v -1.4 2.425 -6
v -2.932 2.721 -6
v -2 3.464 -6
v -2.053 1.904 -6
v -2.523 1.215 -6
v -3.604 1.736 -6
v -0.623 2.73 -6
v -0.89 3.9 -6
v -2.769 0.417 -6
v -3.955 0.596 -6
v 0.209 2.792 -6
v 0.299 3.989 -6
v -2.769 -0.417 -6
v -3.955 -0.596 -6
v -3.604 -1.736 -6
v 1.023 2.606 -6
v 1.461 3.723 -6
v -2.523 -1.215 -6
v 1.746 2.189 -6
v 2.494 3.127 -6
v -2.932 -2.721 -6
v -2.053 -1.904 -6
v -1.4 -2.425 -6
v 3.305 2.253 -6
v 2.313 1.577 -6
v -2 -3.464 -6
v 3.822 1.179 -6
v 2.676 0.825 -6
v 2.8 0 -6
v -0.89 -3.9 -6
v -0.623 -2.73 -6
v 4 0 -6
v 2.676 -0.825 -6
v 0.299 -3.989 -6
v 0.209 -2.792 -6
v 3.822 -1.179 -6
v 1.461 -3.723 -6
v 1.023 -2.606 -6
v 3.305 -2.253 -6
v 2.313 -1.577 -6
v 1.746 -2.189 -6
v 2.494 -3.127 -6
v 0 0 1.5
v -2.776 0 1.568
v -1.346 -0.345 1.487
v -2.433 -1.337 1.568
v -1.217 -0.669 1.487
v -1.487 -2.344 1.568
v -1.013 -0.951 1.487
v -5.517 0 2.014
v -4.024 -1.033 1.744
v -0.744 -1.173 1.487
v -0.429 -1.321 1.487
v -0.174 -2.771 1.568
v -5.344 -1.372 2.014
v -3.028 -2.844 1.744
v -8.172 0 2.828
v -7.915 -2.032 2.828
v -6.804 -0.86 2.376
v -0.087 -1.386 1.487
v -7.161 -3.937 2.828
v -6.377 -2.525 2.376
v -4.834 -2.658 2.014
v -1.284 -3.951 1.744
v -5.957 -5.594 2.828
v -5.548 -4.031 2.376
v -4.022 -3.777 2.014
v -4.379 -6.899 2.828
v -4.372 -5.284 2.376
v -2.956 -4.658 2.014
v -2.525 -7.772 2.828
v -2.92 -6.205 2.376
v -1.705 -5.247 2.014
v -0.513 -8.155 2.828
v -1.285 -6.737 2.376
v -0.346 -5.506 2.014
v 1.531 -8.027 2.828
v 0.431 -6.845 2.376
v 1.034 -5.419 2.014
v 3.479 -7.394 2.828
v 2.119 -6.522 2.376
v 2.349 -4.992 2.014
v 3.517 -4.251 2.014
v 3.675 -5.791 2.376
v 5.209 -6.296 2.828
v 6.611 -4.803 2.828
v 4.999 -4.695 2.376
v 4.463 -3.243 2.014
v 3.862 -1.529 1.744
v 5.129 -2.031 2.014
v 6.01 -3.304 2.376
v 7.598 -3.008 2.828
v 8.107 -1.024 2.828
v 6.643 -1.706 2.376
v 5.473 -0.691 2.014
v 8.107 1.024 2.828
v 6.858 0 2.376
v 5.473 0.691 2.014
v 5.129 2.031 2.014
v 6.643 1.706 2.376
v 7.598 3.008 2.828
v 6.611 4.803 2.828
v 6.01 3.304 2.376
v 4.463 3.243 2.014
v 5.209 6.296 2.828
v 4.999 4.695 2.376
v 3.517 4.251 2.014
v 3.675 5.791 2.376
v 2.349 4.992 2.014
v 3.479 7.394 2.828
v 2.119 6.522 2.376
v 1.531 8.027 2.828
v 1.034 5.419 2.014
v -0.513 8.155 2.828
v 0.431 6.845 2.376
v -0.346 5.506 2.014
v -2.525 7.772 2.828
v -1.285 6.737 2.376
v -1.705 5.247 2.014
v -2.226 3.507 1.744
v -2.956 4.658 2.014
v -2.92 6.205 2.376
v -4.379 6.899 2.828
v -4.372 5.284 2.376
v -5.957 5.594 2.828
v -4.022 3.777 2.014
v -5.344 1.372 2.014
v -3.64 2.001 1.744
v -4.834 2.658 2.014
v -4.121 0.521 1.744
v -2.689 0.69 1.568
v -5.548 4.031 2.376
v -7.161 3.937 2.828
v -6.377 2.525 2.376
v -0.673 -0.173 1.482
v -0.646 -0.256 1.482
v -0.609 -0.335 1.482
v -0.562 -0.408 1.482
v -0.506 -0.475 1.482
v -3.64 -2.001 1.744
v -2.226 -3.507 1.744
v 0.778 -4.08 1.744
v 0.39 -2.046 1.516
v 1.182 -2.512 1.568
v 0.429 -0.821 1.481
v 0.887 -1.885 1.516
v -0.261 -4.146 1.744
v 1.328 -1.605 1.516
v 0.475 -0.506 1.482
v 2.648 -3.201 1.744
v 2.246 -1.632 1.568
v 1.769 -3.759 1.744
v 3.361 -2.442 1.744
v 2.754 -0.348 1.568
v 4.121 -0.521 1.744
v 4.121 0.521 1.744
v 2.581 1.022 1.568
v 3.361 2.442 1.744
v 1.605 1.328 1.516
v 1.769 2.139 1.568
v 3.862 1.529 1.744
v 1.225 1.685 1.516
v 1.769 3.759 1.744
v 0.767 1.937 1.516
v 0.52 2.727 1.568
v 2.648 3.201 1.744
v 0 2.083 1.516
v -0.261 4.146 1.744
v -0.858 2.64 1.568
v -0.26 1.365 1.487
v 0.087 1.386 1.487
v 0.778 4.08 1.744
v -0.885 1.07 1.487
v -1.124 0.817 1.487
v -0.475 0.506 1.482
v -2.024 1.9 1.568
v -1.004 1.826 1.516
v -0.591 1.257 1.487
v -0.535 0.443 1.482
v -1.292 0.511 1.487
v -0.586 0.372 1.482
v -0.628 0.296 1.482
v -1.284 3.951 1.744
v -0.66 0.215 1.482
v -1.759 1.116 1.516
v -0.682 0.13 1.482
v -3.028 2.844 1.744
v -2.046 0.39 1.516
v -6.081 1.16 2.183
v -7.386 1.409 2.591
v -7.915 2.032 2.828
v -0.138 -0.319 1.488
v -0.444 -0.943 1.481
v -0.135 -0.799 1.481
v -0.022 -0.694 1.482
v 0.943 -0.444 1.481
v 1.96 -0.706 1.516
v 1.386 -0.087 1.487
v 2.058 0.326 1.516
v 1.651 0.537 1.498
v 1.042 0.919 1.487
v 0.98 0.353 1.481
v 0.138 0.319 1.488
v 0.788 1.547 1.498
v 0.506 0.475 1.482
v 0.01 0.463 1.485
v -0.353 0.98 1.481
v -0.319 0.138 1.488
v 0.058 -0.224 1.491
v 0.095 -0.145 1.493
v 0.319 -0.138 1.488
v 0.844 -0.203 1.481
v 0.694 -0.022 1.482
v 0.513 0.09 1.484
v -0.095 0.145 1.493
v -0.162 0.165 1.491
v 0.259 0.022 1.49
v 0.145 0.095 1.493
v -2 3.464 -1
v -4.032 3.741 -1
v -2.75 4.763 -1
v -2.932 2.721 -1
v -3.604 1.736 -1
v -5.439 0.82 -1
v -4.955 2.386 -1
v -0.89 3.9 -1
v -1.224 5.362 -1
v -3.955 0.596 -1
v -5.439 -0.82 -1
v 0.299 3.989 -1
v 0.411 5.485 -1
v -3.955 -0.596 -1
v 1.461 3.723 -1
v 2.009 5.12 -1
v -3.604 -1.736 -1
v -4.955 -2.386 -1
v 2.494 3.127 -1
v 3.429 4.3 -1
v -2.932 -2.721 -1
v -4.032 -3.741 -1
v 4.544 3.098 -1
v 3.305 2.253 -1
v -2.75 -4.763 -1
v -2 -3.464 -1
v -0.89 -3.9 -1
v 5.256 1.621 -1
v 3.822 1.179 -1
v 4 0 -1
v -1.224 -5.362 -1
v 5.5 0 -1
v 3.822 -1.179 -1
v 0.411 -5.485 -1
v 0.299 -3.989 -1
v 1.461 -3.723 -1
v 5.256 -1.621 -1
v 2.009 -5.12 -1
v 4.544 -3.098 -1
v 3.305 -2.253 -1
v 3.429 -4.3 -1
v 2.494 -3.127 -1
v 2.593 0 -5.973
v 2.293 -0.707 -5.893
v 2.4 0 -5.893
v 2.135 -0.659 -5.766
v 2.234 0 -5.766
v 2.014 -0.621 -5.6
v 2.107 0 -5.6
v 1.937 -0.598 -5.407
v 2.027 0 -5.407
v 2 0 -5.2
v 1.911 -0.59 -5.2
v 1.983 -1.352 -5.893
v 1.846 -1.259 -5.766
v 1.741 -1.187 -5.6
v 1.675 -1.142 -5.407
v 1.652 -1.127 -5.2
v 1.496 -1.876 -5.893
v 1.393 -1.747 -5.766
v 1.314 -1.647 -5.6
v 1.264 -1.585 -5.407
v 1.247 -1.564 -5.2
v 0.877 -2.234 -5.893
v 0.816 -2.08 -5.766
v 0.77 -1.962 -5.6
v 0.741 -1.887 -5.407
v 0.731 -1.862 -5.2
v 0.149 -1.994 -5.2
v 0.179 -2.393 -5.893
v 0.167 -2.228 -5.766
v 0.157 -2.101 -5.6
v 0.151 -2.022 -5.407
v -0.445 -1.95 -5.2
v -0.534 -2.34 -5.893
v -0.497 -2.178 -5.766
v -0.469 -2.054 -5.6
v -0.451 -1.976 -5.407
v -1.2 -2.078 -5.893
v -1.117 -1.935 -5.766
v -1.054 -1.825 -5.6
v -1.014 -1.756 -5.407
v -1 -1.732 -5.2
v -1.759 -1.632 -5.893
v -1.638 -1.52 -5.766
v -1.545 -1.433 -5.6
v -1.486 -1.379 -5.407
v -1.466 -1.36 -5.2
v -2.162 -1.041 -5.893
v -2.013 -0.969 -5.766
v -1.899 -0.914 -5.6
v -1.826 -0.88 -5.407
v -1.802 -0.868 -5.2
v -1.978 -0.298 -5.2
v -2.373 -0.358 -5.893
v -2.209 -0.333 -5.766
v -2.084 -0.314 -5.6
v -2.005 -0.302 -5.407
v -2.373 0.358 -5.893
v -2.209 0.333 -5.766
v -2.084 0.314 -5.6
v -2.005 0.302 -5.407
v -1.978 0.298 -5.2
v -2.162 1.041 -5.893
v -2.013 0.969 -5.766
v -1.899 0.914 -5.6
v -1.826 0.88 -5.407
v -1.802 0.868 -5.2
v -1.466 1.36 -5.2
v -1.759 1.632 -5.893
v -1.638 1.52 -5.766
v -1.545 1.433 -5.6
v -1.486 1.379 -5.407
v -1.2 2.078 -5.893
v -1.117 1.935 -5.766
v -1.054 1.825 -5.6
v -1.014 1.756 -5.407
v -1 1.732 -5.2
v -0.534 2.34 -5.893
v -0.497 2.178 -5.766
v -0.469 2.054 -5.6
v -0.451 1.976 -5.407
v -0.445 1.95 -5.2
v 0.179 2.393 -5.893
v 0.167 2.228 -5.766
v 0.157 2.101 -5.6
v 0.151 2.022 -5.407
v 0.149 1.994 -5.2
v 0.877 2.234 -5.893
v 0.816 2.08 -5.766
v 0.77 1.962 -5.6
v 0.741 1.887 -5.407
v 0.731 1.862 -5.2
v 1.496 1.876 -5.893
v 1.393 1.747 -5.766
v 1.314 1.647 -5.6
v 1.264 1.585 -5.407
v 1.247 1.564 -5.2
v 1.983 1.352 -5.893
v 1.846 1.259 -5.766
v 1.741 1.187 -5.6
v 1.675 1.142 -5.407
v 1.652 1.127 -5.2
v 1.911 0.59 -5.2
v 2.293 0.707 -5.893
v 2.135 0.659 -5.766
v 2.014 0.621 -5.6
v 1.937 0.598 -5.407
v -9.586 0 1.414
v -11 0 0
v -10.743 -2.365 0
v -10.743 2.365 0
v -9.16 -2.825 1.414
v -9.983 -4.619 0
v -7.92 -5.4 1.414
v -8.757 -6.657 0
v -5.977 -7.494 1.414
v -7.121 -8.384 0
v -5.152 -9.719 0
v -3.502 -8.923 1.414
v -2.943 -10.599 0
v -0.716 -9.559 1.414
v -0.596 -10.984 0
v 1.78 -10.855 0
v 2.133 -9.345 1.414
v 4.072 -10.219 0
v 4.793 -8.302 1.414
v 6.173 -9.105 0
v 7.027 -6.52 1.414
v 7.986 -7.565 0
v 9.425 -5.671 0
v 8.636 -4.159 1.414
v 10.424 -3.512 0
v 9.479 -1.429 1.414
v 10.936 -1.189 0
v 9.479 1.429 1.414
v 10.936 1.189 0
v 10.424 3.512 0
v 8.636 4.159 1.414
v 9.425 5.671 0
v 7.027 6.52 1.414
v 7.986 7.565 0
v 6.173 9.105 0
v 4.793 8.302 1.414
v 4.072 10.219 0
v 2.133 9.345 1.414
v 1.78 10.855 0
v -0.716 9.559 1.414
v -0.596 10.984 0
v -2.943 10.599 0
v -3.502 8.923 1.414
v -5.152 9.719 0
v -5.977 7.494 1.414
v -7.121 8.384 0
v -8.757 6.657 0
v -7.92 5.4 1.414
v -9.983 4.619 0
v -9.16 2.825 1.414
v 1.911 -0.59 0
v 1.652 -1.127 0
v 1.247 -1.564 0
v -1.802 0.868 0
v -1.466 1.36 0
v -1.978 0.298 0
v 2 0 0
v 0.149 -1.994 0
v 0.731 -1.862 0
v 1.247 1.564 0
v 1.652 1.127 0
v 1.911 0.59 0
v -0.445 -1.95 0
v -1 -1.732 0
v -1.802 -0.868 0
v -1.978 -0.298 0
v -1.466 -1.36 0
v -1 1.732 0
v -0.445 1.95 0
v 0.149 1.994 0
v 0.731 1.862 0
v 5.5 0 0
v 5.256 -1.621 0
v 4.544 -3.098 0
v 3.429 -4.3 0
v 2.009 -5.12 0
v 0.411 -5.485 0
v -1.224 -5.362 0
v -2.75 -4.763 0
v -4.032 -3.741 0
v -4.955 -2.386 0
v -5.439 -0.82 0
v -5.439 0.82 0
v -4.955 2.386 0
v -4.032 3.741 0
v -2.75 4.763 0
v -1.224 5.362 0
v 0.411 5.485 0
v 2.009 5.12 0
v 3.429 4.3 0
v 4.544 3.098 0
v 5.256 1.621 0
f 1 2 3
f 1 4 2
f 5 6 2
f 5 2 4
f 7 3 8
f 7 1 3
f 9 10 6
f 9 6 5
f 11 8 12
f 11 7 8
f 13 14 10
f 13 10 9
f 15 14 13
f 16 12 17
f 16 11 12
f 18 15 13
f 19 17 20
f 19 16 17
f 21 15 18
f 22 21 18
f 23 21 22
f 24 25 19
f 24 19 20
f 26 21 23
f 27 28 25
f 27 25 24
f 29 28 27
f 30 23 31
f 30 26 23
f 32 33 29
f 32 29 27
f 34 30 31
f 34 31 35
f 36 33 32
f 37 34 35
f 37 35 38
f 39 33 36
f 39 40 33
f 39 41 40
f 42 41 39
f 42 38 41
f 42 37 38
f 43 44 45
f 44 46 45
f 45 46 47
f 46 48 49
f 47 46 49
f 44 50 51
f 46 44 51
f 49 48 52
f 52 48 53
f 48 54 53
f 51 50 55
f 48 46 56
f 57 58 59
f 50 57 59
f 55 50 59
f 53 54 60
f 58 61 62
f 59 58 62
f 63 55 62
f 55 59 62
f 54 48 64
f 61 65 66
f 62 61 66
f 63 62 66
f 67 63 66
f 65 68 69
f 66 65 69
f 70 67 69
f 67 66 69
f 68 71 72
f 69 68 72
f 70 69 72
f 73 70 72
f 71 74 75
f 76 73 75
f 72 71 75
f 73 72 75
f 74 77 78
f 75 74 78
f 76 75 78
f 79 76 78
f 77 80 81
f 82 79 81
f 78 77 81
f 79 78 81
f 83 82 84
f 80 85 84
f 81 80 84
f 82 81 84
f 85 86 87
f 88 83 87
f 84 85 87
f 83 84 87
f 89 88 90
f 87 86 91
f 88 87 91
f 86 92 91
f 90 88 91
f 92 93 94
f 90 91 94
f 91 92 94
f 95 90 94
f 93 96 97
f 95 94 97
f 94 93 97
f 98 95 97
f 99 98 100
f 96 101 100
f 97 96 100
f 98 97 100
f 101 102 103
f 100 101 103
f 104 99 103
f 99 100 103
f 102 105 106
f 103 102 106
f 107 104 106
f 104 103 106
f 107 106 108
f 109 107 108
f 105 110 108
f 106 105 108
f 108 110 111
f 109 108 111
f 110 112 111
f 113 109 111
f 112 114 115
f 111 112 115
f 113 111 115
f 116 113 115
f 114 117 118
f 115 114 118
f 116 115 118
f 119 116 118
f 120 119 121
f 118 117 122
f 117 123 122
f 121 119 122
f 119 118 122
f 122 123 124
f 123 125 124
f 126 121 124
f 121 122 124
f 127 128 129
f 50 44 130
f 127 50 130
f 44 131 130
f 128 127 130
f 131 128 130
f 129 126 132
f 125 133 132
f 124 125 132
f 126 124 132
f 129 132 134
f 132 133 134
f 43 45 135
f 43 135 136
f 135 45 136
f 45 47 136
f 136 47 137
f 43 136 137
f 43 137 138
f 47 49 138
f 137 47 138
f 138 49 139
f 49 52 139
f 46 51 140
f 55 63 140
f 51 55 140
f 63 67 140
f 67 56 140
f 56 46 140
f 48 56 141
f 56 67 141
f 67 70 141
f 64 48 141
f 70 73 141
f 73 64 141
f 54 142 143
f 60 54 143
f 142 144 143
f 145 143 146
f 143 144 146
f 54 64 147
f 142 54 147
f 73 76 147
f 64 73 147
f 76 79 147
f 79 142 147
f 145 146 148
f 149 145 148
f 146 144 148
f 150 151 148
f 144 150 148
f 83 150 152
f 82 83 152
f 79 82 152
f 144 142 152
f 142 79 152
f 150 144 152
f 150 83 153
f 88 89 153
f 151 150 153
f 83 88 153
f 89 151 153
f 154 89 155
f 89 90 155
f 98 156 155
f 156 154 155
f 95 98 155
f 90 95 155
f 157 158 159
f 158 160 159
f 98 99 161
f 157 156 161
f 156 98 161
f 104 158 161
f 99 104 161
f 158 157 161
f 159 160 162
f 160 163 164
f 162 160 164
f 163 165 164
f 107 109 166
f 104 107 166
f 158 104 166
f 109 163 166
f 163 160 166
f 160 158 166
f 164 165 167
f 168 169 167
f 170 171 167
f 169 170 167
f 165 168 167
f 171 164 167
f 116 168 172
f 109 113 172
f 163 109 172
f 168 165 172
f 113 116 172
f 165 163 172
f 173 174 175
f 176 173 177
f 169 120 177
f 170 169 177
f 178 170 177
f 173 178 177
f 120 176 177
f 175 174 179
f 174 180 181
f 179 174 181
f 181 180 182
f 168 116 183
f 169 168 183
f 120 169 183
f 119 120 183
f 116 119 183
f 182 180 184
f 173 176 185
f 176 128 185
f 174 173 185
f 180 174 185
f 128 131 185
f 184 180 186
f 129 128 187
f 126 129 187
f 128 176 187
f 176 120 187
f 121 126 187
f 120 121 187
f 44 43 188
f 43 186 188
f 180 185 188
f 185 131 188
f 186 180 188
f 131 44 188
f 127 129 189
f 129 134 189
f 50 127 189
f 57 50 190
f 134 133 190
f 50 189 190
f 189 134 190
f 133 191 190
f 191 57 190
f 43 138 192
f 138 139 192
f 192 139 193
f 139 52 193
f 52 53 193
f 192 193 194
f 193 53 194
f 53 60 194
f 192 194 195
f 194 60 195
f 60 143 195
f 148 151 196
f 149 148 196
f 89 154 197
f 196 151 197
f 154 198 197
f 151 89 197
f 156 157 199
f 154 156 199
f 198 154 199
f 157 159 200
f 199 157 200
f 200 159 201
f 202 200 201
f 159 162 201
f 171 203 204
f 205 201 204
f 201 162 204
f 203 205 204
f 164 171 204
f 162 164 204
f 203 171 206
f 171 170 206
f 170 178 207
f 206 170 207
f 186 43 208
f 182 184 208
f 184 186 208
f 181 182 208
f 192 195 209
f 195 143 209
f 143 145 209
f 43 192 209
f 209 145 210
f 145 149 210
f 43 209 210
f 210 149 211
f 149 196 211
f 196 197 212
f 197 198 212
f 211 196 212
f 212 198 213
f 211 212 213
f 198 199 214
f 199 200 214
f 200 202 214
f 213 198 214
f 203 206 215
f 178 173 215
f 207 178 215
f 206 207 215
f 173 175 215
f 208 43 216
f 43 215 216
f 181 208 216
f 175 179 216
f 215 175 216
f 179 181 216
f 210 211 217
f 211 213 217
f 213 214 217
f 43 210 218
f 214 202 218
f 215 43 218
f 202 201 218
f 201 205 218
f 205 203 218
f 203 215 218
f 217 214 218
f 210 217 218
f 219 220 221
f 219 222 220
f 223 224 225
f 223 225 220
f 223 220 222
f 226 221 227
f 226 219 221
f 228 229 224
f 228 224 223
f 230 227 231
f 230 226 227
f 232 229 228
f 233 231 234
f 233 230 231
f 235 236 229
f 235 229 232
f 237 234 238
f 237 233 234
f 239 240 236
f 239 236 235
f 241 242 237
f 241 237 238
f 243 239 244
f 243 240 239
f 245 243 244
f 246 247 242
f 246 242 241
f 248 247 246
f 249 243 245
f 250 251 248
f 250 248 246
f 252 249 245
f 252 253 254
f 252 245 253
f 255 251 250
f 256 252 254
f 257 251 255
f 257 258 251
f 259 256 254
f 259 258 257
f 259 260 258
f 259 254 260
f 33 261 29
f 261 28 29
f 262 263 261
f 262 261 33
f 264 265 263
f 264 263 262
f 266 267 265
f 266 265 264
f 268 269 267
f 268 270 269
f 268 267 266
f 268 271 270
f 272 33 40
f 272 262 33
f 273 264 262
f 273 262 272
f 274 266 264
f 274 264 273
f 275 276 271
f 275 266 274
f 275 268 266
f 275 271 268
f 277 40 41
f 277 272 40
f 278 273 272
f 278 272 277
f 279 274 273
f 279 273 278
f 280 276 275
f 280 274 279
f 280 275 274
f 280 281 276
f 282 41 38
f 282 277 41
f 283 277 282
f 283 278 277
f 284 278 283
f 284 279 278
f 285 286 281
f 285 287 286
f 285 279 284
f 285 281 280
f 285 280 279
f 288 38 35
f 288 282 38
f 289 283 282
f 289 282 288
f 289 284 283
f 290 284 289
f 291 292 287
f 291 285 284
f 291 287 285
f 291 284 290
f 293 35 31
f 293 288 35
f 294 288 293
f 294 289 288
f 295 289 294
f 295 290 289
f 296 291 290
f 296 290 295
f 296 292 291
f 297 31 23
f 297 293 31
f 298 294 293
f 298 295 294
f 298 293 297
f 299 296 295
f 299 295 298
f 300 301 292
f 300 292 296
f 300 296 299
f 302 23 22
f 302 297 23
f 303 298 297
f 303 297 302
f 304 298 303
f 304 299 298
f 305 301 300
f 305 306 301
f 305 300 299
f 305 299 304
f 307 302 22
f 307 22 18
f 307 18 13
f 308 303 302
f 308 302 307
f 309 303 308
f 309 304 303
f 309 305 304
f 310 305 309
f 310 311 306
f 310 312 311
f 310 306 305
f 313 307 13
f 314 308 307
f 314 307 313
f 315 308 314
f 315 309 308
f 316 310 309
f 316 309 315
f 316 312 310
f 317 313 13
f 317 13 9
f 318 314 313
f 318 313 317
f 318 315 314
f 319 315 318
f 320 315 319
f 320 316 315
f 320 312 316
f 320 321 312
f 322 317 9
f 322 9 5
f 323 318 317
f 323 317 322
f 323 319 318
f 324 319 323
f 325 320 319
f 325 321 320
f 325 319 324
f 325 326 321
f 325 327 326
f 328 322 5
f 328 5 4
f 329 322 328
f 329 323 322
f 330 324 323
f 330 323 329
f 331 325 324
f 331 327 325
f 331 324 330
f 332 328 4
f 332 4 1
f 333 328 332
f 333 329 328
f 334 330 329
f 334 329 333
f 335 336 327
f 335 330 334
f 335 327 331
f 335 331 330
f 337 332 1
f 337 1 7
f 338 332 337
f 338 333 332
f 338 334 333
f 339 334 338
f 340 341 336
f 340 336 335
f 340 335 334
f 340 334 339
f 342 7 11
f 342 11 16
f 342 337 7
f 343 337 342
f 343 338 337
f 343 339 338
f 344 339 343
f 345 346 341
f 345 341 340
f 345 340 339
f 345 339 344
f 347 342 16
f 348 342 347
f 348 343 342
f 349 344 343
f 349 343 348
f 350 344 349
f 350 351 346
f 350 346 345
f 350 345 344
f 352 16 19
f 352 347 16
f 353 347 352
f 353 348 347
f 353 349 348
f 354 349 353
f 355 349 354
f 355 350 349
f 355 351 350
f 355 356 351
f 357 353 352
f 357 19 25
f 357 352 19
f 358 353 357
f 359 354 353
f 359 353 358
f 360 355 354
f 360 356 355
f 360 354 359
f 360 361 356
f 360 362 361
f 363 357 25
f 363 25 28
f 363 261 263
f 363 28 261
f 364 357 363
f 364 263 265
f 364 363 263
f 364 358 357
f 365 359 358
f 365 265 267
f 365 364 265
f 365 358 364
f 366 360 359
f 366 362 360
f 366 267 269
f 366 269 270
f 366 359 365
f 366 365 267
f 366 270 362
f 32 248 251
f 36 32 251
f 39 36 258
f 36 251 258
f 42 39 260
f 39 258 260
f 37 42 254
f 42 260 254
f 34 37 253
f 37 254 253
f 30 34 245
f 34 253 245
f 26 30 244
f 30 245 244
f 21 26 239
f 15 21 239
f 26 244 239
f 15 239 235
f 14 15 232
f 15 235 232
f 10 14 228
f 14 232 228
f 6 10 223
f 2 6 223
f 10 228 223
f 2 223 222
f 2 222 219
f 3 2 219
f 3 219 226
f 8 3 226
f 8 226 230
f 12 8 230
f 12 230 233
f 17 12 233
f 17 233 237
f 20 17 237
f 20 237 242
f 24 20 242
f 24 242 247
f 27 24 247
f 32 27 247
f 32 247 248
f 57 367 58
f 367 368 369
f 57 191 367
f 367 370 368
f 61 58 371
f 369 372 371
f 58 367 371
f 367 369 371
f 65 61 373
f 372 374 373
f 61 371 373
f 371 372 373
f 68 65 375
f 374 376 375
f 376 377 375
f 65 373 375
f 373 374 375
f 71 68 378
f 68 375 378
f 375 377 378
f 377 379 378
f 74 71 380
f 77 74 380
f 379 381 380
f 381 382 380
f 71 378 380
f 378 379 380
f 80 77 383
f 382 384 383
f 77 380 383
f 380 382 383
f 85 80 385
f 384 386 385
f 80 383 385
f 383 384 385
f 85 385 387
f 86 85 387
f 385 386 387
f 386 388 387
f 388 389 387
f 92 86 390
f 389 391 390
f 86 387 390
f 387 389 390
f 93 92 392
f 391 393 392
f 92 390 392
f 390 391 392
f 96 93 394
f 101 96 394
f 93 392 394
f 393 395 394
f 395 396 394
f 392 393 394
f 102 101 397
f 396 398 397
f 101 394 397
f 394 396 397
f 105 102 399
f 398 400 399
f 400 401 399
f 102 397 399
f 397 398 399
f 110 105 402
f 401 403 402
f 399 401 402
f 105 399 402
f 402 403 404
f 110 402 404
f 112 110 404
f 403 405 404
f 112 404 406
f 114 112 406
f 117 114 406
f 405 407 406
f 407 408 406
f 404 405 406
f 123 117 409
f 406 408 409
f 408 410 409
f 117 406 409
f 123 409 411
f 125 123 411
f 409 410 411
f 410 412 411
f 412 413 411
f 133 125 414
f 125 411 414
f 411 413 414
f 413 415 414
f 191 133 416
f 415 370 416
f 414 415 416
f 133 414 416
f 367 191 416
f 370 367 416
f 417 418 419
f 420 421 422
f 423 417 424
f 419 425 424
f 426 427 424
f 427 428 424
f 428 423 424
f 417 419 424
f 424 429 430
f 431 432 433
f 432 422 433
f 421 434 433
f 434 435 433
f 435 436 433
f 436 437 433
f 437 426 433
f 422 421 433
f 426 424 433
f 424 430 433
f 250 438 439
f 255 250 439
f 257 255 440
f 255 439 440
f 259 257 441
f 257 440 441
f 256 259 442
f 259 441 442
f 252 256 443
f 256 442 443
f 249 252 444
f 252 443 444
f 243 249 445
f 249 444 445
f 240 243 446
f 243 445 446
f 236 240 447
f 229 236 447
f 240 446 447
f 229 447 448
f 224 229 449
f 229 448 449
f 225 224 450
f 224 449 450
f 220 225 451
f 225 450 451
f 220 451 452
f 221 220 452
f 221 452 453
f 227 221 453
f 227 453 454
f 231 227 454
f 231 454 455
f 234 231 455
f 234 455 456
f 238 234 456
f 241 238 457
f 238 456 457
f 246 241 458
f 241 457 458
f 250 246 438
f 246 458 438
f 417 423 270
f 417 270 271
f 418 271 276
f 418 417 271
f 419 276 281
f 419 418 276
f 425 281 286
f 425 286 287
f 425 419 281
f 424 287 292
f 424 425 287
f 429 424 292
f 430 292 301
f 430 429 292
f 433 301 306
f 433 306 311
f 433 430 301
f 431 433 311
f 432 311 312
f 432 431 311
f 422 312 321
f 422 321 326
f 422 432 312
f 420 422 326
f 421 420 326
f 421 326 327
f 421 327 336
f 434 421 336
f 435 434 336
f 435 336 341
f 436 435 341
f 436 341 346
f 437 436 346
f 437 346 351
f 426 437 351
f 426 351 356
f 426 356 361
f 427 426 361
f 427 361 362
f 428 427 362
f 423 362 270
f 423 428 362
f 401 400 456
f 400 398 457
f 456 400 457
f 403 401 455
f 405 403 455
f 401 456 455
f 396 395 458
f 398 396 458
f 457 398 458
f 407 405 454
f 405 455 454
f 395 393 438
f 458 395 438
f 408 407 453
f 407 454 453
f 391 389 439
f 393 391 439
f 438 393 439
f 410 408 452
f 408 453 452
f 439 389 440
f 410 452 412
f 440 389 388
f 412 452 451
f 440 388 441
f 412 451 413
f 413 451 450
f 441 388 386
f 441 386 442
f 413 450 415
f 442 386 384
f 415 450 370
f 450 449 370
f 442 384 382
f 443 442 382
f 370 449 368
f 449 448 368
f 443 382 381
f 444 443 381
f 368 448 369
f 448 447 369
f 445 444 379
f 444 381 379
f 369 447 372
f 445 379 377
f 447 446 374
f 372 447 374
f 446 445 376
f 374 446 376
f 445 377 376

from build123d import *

# Parameters (mm, degrees)
F2_R     = 5.5
F2_R_2   = 4
F3_DEPTH = 1
F2_R_3   = 2
F4_DEPTH = 6
F5_R     = 0.8


with BuildPart() as f1:
    # F0 (on Front) → F1 (revolve)
    with BuildSketch(Plane.XZ):
        with BuildLine():
            Line((-11, 0), (0, 0))
            Line((0, 0), (0, 1.5))
            ThreePointArc((0, 1.5), (-4.154055, 1.744273), (-8.171573, 2.828427))
            Line((-8.171573, 2.828427), (-11, 0))
        make_face()
    revolve(axis=Axis((0, 0, 0.75), (0, 0, 1)))

    # F2 (on face) → F3 (join)
    with BuildSketch(Plane(origin=(0, 0, 0), x_dir=(1, 0, 0), z_dir=(0, 0, -1))):
        Circle(F2_R)
        Circle(F2_R_2, mode=Mode.SUBTRACT)
    extrude(amount=F3_DEPTH)

    # F2 (on face) → F4 (join)
    with BuildSketch(Plane(origin=(0, 0, 0), x_dir=(1, 0, 0), z_dir=(0, 0, -1))):
        Circle(F2_R_2)
        Circle(F2_R_3, mode=Mode.SUBTRACT)
    extrude(amount=F4_DEPTH)

    # F5
    f5_edges = [f1.edges().sort_by_distance(p)[0] for p in [
        (-2, 0, -6),
    ]]
    fillet(f5_edges, radius=F5_R)


solid = f1.part
